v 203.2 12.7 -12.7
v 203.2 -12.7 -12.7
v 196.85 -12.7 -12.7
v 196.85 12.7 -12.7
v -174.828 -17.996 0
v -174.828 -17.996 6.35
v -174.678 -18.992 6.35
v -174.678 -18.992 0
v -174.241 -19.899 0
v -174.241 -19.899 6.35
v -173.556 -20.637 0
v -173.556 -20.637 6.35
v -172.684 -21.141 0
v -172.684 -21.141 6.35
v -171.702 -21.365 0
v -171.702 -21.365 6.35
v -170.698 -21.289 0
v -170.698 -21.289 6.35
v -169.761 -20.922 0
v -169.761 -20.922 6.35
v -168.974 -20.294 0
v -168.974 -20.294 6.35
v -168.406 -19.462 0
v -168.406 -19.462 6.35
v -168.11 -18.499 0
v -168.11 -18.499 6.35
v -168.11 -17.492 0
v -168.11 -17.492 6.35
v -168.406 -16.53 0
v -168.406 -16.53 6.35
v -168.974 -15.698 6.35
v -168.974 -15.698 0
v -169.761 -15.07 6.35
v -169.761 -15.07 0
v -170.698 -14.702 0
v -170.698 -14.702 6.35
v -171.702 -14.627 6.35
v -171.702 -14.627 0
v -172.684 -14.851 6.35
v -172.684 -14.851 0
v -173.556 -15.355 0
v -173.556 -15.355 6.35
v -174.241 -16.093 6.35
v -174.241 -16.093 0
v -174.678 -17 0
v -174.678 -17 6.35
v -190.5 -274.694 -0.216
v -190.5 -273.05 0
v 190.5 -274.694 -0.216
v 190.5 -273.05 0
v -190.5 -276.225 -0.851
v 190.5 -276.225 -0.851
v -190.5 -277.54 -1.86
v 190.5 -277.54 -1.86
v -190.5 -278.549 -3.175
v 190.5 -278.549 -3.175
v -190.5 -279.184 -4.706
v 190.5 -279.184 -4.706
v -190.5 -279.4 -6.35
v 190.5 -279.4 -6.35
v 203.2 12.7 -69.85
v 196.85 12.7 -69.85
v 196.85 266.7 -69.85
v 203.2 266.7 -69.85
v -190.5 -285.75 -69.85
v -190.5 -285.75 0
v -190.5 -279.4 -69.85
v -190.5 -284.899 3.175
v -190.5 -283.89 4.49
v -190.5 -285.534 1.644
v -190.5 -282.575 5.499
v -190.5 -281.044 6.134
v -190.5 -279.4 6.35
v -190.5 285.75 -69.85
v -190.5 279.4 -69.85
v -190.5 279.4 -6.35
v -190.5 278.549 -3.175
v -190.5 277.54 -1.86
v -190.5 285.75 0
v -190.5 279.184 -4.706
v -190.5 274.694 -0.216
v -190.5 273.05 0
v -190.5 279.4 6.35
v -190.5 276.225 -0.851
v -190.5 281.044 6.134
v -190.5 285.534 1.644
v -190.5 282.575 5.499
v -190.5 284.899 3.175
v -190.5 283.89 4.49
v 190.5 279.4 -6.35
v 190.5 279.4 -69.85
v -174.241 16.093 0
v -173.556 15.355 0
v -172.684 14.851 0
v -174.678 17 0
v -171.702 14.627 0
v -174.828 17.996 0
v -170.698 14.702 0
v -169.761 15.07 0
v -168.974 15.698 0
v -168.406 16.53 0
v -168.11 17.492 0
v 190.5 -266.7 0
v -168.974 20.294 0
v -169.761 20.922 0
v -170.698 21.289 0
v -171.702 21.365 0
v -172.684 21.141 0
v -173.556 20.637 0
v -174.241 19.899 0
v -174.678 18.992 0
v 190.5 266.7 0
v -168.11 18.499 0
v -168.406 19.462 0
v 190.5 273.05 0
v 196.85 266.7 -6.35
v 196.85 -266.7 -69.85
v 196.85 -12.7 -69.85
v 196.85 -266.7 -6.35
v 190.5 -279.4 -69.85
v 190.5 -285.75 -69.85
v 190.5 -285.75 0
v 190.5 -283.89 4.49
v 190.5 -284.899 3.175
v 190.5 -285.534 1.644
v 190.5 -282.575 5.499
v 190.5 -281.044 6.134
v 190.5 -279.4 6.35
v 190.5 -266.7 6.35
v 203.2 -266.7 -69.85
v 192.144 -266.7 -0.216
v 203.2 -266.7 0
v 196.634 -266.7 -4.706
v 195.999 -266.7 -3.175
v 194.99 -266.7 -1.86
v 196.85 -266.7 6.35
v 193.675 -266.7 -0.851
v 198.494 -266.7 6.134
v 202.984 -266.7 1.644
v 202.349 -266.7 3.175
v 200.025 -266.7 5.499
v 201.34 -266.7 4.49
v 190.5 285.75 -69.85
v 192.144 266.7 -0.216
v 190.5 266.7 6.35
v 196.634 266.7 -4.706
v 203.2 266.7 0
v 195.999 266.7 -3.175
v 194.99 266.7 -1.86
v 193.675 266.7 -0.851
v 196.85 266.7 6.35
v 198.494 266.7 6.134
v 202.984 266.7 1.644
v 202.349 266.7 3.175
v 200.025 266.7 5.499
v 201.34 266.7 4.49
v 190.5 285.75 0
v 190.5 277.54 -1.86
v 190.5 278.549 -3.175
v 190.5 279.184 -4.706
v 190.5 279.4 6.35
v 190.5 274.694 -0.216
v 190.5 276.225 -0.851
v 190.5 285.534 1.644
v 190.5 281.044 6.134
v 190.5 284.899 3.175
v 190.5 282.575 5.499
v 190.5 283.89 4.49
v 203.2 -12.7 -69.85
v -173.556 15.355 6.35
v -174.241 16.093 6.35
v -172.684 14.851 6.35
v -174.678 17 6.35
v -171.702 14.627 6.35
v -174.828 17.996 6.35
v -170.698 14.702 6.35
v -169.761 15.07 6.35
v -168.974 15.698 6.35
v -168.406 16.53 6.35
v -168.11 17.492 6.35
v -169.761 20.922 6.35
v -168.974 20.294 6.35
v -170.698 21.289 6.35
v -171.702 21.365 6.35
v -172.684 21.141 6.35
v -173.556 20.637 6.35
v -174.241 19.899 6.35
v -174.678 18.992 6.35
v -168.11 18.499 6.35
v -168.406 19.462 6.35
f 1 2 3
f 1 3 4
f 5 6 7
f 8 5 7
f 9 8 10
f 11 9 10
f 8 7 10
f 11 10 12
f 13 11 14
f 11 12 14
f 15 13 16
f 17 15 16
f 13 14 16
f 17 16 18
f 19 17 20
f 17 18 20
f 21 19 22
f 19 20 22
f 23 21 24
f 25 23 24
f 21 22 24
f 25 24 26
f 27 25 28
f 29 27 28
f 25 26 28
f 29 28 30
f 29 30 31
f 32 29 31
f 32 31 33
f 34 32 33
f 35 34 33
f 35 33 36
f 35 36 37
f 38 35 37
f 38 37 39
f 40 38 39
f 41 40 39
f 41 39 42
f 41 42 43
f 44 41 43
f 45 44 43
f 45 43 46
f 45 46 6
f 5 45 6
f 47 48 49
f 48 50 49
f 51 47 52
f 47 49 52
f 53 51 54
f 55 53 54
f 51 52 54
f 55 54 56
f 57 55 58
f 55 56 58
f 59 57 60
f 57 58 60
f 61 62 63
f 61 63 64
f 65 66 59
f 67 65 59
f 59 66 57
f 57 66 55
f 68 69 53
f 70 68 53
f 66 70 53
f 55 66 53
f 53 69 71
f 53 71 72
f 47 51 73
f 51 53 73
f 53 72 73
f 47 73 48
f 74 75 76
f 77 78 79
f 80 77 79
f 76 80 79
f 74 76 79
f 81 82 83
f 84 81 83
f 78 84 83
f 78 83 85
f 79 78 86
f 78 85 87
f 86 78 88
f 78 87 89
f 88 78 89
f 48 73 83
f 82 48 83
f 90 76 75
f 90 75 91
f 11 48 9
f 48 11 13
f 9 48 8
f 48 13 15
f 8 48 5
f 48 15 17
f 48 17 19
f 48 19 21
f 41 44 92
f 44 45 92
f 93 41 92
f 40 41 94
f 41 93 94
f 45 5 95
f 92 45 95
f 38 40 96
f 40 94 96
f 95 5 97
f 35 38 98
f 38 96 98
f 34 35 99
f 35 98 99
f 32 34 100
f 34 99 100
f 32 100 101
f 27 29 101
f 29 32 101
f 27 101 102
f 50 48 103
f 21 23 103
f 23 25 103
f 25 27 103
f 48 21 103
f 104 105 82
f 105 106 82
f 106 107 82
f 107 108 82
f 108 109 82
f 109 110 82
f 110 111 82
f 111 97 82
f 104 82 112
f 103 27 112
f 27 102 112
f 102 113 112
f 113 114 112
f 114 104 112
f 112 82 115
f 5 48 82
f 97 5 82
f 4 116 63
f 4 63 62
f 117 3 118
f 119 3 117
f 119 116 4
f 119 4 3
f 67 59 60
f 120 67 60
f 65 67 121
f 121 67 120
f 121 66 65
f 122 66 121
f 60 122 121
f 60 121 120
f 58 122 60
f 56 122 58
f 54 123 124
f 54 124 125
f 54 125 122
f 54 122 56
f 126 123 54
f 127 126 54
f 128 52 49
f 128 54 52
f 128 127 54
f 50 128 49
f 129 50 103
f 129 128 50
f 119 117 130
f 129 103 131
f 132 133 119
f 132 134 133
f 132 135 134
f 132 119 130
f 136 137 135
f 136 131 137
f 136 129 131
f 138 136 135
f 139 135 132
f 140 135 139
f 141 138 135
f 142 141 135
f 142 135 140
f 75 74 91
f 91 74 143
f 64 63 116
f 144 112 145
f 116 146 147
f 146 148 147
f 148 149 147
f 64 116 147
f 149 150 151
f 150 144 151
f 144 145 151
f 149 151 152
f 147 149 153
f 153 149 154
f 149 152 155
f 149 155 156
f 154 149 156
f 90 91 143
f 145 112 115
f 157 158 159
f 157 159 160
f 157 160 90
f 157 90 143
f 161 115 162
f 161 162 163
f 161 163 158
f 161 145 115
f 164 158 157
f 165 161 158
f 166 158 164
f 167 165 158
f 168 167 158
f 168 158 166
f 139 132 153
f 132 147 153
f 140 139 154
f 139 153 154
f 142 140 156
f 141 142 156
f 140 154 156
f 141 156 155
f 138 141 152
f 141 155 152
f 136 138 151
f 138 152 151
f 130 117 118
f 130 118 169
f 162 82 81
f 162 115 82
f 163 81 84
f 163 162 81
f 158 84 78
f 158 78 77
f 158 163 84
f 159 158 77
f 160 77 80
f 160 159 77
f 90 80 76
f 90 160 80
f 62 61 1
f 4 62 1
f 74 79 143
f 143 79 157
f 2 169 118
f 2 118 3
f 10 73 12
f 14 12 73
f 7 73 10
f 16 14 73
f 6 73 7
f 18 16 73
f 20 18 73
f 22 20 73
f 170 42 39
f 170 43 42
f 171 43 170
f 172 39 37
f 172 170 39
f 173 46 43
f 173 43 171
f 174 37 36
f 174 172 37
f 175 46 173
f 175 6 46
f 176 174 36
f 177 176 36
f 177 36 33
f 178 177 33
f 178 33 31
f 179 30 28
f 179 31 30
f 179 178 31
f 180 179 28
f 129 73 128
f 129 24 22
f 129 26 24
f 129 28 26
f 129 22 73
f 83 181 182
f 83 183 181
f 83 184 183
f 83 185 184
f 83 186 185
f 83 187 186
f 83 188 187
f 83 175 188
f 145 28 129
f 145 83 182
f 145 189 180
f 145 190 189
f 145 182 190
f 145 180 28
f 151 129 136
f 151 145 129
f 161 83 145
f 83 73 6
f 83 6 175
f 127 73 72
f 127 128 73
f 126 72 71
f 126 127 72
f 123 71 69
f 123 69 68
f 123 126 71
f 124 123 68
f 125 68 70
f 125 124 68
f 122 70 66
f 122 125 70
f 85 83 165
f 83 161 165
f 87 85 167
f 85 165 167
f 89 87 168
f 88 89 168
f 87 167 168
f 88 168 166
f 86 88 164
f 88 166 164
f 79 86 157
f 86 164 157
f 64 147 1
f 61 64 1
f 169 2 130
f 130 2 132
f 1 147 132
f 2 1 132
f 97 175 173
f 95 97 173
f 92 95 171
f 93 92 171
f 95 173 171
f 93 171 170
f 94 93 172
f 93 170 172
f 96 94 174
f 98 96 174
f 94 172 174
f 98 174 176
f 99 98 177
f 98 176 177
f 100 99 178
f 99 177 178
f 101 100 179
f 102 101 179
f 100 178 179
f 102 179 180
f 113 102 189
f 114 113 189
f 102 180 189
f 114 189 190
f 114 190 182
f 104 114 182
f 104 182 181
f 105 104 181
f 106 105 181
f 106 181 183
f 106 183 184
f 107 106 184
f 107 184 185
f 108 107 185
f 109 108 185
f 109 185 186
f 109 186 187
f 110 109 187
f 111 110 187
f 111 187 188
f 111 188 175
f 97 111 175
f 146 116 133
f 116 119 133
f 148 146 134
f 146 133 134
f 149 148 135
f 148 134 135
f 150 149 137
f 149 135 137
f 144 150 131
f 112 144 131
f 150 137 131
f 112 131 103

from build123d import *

# Parameters (mm, degrees)
F0_W     = 381
F0_H     = 558.8
F1_DEPTH = 6.35
F2_W     = 381
F2_H     = 6.35
F3_DEPTH = 76.2
F4_W     = 12.7
F4_H     = 533.4
F5_DEPTH = 6.35
F6_W     = 6.35
F6_H     = 533.4
F7_DEPTH = 69.85
F8_W     = 25.4
F8_H     = 57.15
F9_DEPTH = 393.701
F10_R    = 6.35
F12_D    = 6.7564


with BuildPart() as f1:
    # F0 (on Top) → F1 (new body)
    with BuildSketch(Plane.XY):
        Rectangle(F0_W, F0_H)
    extrude(amount=F1_DEPTH)

    # F2 (on face) → F3 (join)
    with BuildSketch(Plane.XY.offset(6.35)):
        with Locations((0, -282.575)):
            Rectangle(F2_W, F2_H)
        with Locations((0, 282.575)):
            Rectangle(F2_W, F2_H)
    extrude(amount=-F3_DEPTH)

    # F4 (on face) → F5 (join)
    with BuildSketch(Plane.XY.offset(6.35)):
        with Locations((196.85, 0)):
            Rectangle(F4_W, F4_H)
    extrude(amount=-F5_DEPTH)

    # F6 (on face) → F7 (join)
    with BuildSketch(Plane(origin=(0, 0, 0), x_dir=(1, 0, 0), z_dir=(0, 0, -1))):
        with Locations((200.025, 0)):
            Rectangle(F6_W, F6_H)
    extrude(amount=F7_DEPTH)

    # F8 (on face) → F9 (cut, through all)
    with BuildSketch(Plane.YZ.offset(203.2)):
        with Locations((0, -41.275)):
            Rectangle(F8_W, F8_H)
    extrude(amount=-F9_DEPTH, mode=Mode.SUBTRACT)

    # F10
    f10_edges = [f1.edges().sort_by_distance(p)[0] for p in [
        (0, 285.75, 6.35),
        (0, -285.75, 6.35),
        (203.2, 0, 6.35),
        (0, -279.4, 0),
        (196.85, 0, 0),
        (0, 279.4, 0),
    ]]
    fillet(f10_edges, radius=F10_R)

    # F12 (through all)
    with Locations(Plane(origin=(0, 0, 0), x_dir=(1, 0, 0), z_dir=(0, 0, -1))):
        with Locations((-171.45, 17.9959), (-171.45, -17.9959)):
            Hole(F12_D / 2)


solid = f1.part
